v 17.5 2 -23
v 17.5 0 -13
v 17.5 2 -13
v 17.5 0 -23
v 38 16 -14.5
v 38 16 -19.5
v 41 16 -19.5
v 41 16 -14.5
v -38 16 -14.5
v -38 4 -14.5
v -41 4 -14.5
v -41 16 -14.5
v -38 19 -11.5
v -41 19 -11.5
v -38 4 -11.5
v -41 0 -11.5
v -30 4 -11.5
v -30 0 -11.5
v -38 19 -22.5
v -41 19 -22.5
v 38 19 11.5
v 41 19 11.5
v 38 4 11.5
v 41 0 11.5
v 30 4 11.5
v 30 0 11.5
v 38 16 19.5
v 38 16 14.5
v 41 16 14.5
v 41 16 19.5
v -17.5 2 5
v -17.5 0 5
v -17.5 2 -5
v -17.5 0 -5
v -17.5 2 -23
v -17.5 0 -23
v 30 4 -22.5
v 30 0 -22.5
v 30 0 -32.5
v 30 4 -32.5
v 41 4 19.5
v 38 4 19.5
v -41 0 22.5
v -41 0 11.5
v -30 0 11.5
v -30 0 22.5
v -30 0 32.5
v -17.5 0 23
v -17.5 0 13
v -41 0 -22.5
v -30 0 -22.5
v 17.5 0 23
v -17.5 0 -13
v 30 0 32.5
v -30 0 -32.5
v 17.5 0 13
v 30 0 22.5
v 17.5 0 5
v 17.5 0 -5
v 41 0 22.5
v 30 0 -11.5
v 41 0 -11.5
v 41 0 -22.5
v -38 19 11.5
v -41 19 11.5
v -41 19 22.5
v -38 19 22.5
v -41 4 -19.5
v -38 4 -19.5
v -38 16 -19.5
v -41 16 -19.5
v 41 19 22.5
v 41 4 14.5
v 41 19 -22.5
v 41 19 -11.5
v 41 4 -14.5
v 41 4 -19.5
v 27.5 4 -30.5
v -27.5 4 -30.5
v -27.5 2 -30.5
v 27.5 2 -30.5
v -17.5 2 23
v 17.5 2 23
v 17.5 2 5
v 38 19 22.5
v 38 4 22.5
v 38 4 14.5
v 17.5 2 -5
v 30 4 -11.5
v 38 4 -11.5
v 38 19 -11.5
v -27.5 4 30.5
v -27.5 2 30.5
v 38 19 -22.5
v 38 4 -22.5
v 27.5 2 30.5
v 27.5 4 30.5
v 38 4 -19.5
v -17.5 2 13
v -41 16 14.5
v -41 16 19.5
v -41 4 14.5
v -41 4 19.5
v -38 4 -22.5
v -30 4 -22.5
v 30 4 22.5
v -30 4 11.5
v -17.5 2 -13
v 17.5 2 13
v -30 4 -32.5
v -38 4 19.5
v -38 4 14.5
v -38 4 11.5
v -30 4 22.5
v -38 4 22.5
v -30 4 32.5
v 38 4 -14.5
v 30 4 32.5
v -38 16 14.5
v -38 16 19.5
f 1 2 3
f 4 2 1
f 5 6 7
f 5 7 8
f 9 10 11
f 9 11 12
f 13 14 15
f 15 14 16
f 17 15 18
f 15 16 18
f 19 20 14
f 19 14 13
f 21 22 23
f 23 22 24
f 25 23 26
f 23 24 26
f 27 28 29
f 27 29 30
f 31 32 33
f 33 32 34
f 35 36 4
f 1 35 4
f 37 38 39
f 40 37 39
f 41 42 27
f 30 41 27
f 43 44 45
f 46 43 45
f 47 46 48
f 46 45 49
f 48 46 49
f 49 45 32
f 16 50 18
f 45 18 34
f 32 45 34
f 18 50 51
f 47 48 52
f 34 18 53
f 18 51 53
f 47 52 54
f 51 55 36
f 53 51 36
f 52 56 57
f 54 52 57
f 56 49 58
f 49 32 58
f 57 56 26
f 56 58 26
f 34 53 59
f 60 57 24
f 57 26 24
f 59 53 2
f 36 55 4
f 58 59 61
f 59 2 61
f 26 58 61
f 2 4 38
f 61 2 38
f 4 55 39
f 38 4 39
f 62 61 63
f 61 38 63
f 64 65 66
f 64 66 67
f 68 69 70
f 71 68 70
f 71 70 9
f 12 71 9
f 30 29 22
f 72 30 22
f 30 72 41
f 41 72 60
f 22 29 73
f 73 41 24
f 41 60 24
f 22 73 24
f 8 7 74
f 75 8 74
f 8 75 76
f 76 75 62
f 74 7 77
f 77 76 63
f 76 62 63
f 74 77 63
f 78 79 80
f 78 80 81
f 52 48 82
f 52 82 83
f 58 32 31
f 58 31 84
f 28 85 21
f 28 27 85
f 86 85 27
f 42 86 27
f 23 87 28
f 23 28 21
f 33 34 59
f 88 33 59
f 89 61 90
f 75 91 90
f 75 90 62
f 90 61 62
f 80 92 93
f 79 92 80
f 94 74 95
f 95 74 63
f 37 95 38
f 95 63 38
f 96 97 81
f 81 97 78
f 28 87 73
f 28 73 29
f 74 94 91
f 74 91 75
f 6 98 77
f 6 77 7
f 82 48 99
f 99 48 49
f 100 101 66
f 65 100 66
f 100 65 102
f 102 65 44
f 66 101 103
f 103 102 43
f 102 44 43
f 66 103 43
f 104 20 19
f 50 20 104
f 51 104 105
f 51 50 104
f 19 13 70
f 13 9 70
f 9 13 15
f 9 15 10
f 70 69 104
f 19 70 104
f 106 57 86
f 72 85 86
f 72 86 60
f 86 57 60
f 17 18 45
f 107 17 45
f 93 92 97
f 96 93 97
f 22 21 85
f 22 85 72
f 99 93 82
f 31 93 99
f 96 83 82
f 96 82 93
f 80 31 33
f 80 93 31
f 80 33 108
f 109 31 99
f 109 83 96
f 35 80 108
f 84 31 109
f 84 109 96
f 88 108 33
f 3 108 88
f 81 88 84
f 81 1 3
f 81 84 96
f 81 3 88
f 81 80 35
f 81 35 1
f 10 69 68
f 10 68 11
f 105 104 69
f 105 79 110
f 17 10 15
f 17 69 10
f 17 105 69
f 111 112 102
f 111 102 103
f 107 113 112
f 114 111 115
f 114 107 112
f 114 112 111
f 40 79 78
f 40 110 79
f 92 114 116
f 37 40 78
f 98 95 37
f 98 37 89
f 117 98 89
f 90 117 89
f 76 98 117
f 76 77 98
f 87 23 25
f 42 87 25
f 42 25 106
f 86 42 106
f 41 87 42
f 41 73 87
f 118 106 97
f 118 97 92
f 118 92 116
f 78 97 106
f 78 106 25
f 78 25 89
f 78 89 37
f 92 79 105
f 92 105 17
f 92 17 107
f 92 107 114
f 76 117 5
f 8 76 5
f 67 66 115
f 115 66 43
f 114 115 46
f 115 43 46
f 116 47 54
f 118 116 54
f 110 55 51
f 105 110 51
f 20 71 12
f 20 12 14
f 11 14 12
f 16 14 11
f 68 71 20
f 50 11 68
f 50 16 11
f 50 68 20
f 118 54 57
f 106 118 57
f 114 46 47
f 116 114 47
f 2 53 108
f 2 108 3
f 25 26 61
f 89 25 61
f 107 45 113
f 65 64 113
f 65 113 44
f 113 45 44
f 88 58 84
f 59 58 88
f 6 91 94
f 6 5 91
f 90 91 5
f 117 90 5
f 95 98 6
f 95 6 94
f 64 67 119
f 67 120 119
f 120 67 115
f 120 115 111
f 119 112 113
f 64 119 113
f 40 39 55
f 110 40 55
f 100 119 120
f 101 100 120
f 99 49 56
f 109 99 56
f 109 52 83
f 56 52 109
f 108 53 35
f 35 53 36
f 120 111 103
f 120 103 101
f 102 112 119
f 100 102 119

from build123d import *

# Parameters (mm, degrees)
SALIENTE_EXTRUIR1_DEPTH    = 4
CROQUIS2_W                 = 55
CROQUIS2_H                 = 61
CORTAR_EXTRUIR1_DEPTH      = 2
CROQUIS12_W                = 3
CROQUIS12_H                = 11
SALIENTE_EXTRUIR2_DEPTH    = 15
CROQUIS13_W                = 5
CROQUIS13_H                = 12
CORTAR_EXTRUIR8_DEPTH      = 80
CORTAR_EXTRUIR8_DEPTH_BACK = 4
CROQUIS14_W                = 5
CROQUIS14_H                = 12
CORTAR_EXTRUIR9_DEPTH      = 80
CORTAR_EXTRUIR9_DEPTH_BACK = 4
CROQUIS15_W                = 35
CROQUIS15_H                = 10
CORTAR_EXTRUIR10_DEPTH     = 20


with BuildPart() as part:
    # Croquis1 → Saliente-Extruir1 (new body)
    with BuildSketch(Plane(origin=(0, 0, 0), x_dir=(1, 0, 0), z_dir=(0, 1, 0))):
        Polygon((30, -32.5), (30, -22.5), (41, -22.5), (41, -11.5), (30, -11.5), (30, 11.5), (41, 11.5), (41, 22.5), (30, 22.5), (30, 32.5), (-30, 32.5), (-30, 22.5), (-41, 22.5), (-41, 11.5), (-30, 11.5), (-30, -11.5), (-41, -11.5), (-41, -22.5), (-30, -22.5), (-30, -32.5), align=None)
    extrude(amount=SALIENTE_EXTRUIR1_DEPTH)

    # Croquis2 → Cortar-Extruir1 (cut)
    with BuildSketch(Plane(origin=(0, 4, 0), x_dir=(1, 0, 0), z_dir=(0, 1, 0))):
        Rectangle(CROQUIS2_W, CROQUIS2_H)
    extrude(amount=-CORTAR_EXTRUIR1_DEPTH, mode=Mode.SUBTRACT)

    # Croquis12 → Saliente-Extruir2 (add)
    with BuildSketch(Plane(origin=(0, 4, 0), x_dir=(1, 0, 0), z_dir=(0, 1, 0))):
        with Locations((-39.5, 17)):
            Rectangle(CROQUIS12_W, CROQUIS12_H)
        with Locations((-39.5, -17)):
            Rectangle(CROQUIS12_W, CROQUIS12_H)
        with Locations((39.5, -17)):
            Rectangle(CROQUIS12_W, CROQUIS12_H)
        with Locations((39.5, 17)):
            Rectangle(CROQUIS12_W, CROQUIS12_H)
    extrude(amount=SALIENTE_EXTRUIR2_DEPTH)

    # Croquis13 → Cortar-Extruir8 (cut, two sides)
    with BuildSketch(Plane.ZY.offset(-38)) as cortar_extruir8_sk:
        with Locations((-17, 10)):
            Rectangle(CROQUIS13_W, CROQUIS13_H)
    extrude(amount=CORTAR_EXTRUIR8_DEPTH, mode=Mode.SUBTRACT)
    extrude(cortar_extruir8_sk.sketch, amount=-CORTAR_EXTRUIR8_DEPTH_BACK, mode=Mode.SUBTRACT)

    # Croquis14 → Cortar-Extruir9 (cut, two sides)
    with BuildSketch(Plane.ZY.offset(-38)) as cortar_extruir9_sk:
        with Locations((17, 10)):
            Rectangle(CROQUIS14_W, CROQUIS14_H)
    extrude(amount=CORTAR_EXTRUIR9_DEPTH, mode=Mode.SUBTRACT)
    extrude(cortar_extruir9_sk.sketch, amount=-CORTAR_EXTRUIR9_DEPTH_BACK, mode=Mode.SUBTRACT)

    # Croquis15 → Cortar-Extruir10 (cut, through all)
    with BuildSketch(Plane(origin=(0, 0, 0), x_dir=(1, 0, 0), z_dir=(0, 1, 0))):
        Rectangle(CROQUIS15_W, CROQUIS15_H)
        with Locations((0, -18)):
            Rectangle(CROQUIS15_W, CROQUIS15_H)
        with Locations((0, 18)):
            Rectangle(CROQUIS15_W, CROQUIS15_H)
    extrude(amount=CORTAR_EXTRUIR10_DEPTH, mode=Mode.SUBTRACT)


solid = part.part
